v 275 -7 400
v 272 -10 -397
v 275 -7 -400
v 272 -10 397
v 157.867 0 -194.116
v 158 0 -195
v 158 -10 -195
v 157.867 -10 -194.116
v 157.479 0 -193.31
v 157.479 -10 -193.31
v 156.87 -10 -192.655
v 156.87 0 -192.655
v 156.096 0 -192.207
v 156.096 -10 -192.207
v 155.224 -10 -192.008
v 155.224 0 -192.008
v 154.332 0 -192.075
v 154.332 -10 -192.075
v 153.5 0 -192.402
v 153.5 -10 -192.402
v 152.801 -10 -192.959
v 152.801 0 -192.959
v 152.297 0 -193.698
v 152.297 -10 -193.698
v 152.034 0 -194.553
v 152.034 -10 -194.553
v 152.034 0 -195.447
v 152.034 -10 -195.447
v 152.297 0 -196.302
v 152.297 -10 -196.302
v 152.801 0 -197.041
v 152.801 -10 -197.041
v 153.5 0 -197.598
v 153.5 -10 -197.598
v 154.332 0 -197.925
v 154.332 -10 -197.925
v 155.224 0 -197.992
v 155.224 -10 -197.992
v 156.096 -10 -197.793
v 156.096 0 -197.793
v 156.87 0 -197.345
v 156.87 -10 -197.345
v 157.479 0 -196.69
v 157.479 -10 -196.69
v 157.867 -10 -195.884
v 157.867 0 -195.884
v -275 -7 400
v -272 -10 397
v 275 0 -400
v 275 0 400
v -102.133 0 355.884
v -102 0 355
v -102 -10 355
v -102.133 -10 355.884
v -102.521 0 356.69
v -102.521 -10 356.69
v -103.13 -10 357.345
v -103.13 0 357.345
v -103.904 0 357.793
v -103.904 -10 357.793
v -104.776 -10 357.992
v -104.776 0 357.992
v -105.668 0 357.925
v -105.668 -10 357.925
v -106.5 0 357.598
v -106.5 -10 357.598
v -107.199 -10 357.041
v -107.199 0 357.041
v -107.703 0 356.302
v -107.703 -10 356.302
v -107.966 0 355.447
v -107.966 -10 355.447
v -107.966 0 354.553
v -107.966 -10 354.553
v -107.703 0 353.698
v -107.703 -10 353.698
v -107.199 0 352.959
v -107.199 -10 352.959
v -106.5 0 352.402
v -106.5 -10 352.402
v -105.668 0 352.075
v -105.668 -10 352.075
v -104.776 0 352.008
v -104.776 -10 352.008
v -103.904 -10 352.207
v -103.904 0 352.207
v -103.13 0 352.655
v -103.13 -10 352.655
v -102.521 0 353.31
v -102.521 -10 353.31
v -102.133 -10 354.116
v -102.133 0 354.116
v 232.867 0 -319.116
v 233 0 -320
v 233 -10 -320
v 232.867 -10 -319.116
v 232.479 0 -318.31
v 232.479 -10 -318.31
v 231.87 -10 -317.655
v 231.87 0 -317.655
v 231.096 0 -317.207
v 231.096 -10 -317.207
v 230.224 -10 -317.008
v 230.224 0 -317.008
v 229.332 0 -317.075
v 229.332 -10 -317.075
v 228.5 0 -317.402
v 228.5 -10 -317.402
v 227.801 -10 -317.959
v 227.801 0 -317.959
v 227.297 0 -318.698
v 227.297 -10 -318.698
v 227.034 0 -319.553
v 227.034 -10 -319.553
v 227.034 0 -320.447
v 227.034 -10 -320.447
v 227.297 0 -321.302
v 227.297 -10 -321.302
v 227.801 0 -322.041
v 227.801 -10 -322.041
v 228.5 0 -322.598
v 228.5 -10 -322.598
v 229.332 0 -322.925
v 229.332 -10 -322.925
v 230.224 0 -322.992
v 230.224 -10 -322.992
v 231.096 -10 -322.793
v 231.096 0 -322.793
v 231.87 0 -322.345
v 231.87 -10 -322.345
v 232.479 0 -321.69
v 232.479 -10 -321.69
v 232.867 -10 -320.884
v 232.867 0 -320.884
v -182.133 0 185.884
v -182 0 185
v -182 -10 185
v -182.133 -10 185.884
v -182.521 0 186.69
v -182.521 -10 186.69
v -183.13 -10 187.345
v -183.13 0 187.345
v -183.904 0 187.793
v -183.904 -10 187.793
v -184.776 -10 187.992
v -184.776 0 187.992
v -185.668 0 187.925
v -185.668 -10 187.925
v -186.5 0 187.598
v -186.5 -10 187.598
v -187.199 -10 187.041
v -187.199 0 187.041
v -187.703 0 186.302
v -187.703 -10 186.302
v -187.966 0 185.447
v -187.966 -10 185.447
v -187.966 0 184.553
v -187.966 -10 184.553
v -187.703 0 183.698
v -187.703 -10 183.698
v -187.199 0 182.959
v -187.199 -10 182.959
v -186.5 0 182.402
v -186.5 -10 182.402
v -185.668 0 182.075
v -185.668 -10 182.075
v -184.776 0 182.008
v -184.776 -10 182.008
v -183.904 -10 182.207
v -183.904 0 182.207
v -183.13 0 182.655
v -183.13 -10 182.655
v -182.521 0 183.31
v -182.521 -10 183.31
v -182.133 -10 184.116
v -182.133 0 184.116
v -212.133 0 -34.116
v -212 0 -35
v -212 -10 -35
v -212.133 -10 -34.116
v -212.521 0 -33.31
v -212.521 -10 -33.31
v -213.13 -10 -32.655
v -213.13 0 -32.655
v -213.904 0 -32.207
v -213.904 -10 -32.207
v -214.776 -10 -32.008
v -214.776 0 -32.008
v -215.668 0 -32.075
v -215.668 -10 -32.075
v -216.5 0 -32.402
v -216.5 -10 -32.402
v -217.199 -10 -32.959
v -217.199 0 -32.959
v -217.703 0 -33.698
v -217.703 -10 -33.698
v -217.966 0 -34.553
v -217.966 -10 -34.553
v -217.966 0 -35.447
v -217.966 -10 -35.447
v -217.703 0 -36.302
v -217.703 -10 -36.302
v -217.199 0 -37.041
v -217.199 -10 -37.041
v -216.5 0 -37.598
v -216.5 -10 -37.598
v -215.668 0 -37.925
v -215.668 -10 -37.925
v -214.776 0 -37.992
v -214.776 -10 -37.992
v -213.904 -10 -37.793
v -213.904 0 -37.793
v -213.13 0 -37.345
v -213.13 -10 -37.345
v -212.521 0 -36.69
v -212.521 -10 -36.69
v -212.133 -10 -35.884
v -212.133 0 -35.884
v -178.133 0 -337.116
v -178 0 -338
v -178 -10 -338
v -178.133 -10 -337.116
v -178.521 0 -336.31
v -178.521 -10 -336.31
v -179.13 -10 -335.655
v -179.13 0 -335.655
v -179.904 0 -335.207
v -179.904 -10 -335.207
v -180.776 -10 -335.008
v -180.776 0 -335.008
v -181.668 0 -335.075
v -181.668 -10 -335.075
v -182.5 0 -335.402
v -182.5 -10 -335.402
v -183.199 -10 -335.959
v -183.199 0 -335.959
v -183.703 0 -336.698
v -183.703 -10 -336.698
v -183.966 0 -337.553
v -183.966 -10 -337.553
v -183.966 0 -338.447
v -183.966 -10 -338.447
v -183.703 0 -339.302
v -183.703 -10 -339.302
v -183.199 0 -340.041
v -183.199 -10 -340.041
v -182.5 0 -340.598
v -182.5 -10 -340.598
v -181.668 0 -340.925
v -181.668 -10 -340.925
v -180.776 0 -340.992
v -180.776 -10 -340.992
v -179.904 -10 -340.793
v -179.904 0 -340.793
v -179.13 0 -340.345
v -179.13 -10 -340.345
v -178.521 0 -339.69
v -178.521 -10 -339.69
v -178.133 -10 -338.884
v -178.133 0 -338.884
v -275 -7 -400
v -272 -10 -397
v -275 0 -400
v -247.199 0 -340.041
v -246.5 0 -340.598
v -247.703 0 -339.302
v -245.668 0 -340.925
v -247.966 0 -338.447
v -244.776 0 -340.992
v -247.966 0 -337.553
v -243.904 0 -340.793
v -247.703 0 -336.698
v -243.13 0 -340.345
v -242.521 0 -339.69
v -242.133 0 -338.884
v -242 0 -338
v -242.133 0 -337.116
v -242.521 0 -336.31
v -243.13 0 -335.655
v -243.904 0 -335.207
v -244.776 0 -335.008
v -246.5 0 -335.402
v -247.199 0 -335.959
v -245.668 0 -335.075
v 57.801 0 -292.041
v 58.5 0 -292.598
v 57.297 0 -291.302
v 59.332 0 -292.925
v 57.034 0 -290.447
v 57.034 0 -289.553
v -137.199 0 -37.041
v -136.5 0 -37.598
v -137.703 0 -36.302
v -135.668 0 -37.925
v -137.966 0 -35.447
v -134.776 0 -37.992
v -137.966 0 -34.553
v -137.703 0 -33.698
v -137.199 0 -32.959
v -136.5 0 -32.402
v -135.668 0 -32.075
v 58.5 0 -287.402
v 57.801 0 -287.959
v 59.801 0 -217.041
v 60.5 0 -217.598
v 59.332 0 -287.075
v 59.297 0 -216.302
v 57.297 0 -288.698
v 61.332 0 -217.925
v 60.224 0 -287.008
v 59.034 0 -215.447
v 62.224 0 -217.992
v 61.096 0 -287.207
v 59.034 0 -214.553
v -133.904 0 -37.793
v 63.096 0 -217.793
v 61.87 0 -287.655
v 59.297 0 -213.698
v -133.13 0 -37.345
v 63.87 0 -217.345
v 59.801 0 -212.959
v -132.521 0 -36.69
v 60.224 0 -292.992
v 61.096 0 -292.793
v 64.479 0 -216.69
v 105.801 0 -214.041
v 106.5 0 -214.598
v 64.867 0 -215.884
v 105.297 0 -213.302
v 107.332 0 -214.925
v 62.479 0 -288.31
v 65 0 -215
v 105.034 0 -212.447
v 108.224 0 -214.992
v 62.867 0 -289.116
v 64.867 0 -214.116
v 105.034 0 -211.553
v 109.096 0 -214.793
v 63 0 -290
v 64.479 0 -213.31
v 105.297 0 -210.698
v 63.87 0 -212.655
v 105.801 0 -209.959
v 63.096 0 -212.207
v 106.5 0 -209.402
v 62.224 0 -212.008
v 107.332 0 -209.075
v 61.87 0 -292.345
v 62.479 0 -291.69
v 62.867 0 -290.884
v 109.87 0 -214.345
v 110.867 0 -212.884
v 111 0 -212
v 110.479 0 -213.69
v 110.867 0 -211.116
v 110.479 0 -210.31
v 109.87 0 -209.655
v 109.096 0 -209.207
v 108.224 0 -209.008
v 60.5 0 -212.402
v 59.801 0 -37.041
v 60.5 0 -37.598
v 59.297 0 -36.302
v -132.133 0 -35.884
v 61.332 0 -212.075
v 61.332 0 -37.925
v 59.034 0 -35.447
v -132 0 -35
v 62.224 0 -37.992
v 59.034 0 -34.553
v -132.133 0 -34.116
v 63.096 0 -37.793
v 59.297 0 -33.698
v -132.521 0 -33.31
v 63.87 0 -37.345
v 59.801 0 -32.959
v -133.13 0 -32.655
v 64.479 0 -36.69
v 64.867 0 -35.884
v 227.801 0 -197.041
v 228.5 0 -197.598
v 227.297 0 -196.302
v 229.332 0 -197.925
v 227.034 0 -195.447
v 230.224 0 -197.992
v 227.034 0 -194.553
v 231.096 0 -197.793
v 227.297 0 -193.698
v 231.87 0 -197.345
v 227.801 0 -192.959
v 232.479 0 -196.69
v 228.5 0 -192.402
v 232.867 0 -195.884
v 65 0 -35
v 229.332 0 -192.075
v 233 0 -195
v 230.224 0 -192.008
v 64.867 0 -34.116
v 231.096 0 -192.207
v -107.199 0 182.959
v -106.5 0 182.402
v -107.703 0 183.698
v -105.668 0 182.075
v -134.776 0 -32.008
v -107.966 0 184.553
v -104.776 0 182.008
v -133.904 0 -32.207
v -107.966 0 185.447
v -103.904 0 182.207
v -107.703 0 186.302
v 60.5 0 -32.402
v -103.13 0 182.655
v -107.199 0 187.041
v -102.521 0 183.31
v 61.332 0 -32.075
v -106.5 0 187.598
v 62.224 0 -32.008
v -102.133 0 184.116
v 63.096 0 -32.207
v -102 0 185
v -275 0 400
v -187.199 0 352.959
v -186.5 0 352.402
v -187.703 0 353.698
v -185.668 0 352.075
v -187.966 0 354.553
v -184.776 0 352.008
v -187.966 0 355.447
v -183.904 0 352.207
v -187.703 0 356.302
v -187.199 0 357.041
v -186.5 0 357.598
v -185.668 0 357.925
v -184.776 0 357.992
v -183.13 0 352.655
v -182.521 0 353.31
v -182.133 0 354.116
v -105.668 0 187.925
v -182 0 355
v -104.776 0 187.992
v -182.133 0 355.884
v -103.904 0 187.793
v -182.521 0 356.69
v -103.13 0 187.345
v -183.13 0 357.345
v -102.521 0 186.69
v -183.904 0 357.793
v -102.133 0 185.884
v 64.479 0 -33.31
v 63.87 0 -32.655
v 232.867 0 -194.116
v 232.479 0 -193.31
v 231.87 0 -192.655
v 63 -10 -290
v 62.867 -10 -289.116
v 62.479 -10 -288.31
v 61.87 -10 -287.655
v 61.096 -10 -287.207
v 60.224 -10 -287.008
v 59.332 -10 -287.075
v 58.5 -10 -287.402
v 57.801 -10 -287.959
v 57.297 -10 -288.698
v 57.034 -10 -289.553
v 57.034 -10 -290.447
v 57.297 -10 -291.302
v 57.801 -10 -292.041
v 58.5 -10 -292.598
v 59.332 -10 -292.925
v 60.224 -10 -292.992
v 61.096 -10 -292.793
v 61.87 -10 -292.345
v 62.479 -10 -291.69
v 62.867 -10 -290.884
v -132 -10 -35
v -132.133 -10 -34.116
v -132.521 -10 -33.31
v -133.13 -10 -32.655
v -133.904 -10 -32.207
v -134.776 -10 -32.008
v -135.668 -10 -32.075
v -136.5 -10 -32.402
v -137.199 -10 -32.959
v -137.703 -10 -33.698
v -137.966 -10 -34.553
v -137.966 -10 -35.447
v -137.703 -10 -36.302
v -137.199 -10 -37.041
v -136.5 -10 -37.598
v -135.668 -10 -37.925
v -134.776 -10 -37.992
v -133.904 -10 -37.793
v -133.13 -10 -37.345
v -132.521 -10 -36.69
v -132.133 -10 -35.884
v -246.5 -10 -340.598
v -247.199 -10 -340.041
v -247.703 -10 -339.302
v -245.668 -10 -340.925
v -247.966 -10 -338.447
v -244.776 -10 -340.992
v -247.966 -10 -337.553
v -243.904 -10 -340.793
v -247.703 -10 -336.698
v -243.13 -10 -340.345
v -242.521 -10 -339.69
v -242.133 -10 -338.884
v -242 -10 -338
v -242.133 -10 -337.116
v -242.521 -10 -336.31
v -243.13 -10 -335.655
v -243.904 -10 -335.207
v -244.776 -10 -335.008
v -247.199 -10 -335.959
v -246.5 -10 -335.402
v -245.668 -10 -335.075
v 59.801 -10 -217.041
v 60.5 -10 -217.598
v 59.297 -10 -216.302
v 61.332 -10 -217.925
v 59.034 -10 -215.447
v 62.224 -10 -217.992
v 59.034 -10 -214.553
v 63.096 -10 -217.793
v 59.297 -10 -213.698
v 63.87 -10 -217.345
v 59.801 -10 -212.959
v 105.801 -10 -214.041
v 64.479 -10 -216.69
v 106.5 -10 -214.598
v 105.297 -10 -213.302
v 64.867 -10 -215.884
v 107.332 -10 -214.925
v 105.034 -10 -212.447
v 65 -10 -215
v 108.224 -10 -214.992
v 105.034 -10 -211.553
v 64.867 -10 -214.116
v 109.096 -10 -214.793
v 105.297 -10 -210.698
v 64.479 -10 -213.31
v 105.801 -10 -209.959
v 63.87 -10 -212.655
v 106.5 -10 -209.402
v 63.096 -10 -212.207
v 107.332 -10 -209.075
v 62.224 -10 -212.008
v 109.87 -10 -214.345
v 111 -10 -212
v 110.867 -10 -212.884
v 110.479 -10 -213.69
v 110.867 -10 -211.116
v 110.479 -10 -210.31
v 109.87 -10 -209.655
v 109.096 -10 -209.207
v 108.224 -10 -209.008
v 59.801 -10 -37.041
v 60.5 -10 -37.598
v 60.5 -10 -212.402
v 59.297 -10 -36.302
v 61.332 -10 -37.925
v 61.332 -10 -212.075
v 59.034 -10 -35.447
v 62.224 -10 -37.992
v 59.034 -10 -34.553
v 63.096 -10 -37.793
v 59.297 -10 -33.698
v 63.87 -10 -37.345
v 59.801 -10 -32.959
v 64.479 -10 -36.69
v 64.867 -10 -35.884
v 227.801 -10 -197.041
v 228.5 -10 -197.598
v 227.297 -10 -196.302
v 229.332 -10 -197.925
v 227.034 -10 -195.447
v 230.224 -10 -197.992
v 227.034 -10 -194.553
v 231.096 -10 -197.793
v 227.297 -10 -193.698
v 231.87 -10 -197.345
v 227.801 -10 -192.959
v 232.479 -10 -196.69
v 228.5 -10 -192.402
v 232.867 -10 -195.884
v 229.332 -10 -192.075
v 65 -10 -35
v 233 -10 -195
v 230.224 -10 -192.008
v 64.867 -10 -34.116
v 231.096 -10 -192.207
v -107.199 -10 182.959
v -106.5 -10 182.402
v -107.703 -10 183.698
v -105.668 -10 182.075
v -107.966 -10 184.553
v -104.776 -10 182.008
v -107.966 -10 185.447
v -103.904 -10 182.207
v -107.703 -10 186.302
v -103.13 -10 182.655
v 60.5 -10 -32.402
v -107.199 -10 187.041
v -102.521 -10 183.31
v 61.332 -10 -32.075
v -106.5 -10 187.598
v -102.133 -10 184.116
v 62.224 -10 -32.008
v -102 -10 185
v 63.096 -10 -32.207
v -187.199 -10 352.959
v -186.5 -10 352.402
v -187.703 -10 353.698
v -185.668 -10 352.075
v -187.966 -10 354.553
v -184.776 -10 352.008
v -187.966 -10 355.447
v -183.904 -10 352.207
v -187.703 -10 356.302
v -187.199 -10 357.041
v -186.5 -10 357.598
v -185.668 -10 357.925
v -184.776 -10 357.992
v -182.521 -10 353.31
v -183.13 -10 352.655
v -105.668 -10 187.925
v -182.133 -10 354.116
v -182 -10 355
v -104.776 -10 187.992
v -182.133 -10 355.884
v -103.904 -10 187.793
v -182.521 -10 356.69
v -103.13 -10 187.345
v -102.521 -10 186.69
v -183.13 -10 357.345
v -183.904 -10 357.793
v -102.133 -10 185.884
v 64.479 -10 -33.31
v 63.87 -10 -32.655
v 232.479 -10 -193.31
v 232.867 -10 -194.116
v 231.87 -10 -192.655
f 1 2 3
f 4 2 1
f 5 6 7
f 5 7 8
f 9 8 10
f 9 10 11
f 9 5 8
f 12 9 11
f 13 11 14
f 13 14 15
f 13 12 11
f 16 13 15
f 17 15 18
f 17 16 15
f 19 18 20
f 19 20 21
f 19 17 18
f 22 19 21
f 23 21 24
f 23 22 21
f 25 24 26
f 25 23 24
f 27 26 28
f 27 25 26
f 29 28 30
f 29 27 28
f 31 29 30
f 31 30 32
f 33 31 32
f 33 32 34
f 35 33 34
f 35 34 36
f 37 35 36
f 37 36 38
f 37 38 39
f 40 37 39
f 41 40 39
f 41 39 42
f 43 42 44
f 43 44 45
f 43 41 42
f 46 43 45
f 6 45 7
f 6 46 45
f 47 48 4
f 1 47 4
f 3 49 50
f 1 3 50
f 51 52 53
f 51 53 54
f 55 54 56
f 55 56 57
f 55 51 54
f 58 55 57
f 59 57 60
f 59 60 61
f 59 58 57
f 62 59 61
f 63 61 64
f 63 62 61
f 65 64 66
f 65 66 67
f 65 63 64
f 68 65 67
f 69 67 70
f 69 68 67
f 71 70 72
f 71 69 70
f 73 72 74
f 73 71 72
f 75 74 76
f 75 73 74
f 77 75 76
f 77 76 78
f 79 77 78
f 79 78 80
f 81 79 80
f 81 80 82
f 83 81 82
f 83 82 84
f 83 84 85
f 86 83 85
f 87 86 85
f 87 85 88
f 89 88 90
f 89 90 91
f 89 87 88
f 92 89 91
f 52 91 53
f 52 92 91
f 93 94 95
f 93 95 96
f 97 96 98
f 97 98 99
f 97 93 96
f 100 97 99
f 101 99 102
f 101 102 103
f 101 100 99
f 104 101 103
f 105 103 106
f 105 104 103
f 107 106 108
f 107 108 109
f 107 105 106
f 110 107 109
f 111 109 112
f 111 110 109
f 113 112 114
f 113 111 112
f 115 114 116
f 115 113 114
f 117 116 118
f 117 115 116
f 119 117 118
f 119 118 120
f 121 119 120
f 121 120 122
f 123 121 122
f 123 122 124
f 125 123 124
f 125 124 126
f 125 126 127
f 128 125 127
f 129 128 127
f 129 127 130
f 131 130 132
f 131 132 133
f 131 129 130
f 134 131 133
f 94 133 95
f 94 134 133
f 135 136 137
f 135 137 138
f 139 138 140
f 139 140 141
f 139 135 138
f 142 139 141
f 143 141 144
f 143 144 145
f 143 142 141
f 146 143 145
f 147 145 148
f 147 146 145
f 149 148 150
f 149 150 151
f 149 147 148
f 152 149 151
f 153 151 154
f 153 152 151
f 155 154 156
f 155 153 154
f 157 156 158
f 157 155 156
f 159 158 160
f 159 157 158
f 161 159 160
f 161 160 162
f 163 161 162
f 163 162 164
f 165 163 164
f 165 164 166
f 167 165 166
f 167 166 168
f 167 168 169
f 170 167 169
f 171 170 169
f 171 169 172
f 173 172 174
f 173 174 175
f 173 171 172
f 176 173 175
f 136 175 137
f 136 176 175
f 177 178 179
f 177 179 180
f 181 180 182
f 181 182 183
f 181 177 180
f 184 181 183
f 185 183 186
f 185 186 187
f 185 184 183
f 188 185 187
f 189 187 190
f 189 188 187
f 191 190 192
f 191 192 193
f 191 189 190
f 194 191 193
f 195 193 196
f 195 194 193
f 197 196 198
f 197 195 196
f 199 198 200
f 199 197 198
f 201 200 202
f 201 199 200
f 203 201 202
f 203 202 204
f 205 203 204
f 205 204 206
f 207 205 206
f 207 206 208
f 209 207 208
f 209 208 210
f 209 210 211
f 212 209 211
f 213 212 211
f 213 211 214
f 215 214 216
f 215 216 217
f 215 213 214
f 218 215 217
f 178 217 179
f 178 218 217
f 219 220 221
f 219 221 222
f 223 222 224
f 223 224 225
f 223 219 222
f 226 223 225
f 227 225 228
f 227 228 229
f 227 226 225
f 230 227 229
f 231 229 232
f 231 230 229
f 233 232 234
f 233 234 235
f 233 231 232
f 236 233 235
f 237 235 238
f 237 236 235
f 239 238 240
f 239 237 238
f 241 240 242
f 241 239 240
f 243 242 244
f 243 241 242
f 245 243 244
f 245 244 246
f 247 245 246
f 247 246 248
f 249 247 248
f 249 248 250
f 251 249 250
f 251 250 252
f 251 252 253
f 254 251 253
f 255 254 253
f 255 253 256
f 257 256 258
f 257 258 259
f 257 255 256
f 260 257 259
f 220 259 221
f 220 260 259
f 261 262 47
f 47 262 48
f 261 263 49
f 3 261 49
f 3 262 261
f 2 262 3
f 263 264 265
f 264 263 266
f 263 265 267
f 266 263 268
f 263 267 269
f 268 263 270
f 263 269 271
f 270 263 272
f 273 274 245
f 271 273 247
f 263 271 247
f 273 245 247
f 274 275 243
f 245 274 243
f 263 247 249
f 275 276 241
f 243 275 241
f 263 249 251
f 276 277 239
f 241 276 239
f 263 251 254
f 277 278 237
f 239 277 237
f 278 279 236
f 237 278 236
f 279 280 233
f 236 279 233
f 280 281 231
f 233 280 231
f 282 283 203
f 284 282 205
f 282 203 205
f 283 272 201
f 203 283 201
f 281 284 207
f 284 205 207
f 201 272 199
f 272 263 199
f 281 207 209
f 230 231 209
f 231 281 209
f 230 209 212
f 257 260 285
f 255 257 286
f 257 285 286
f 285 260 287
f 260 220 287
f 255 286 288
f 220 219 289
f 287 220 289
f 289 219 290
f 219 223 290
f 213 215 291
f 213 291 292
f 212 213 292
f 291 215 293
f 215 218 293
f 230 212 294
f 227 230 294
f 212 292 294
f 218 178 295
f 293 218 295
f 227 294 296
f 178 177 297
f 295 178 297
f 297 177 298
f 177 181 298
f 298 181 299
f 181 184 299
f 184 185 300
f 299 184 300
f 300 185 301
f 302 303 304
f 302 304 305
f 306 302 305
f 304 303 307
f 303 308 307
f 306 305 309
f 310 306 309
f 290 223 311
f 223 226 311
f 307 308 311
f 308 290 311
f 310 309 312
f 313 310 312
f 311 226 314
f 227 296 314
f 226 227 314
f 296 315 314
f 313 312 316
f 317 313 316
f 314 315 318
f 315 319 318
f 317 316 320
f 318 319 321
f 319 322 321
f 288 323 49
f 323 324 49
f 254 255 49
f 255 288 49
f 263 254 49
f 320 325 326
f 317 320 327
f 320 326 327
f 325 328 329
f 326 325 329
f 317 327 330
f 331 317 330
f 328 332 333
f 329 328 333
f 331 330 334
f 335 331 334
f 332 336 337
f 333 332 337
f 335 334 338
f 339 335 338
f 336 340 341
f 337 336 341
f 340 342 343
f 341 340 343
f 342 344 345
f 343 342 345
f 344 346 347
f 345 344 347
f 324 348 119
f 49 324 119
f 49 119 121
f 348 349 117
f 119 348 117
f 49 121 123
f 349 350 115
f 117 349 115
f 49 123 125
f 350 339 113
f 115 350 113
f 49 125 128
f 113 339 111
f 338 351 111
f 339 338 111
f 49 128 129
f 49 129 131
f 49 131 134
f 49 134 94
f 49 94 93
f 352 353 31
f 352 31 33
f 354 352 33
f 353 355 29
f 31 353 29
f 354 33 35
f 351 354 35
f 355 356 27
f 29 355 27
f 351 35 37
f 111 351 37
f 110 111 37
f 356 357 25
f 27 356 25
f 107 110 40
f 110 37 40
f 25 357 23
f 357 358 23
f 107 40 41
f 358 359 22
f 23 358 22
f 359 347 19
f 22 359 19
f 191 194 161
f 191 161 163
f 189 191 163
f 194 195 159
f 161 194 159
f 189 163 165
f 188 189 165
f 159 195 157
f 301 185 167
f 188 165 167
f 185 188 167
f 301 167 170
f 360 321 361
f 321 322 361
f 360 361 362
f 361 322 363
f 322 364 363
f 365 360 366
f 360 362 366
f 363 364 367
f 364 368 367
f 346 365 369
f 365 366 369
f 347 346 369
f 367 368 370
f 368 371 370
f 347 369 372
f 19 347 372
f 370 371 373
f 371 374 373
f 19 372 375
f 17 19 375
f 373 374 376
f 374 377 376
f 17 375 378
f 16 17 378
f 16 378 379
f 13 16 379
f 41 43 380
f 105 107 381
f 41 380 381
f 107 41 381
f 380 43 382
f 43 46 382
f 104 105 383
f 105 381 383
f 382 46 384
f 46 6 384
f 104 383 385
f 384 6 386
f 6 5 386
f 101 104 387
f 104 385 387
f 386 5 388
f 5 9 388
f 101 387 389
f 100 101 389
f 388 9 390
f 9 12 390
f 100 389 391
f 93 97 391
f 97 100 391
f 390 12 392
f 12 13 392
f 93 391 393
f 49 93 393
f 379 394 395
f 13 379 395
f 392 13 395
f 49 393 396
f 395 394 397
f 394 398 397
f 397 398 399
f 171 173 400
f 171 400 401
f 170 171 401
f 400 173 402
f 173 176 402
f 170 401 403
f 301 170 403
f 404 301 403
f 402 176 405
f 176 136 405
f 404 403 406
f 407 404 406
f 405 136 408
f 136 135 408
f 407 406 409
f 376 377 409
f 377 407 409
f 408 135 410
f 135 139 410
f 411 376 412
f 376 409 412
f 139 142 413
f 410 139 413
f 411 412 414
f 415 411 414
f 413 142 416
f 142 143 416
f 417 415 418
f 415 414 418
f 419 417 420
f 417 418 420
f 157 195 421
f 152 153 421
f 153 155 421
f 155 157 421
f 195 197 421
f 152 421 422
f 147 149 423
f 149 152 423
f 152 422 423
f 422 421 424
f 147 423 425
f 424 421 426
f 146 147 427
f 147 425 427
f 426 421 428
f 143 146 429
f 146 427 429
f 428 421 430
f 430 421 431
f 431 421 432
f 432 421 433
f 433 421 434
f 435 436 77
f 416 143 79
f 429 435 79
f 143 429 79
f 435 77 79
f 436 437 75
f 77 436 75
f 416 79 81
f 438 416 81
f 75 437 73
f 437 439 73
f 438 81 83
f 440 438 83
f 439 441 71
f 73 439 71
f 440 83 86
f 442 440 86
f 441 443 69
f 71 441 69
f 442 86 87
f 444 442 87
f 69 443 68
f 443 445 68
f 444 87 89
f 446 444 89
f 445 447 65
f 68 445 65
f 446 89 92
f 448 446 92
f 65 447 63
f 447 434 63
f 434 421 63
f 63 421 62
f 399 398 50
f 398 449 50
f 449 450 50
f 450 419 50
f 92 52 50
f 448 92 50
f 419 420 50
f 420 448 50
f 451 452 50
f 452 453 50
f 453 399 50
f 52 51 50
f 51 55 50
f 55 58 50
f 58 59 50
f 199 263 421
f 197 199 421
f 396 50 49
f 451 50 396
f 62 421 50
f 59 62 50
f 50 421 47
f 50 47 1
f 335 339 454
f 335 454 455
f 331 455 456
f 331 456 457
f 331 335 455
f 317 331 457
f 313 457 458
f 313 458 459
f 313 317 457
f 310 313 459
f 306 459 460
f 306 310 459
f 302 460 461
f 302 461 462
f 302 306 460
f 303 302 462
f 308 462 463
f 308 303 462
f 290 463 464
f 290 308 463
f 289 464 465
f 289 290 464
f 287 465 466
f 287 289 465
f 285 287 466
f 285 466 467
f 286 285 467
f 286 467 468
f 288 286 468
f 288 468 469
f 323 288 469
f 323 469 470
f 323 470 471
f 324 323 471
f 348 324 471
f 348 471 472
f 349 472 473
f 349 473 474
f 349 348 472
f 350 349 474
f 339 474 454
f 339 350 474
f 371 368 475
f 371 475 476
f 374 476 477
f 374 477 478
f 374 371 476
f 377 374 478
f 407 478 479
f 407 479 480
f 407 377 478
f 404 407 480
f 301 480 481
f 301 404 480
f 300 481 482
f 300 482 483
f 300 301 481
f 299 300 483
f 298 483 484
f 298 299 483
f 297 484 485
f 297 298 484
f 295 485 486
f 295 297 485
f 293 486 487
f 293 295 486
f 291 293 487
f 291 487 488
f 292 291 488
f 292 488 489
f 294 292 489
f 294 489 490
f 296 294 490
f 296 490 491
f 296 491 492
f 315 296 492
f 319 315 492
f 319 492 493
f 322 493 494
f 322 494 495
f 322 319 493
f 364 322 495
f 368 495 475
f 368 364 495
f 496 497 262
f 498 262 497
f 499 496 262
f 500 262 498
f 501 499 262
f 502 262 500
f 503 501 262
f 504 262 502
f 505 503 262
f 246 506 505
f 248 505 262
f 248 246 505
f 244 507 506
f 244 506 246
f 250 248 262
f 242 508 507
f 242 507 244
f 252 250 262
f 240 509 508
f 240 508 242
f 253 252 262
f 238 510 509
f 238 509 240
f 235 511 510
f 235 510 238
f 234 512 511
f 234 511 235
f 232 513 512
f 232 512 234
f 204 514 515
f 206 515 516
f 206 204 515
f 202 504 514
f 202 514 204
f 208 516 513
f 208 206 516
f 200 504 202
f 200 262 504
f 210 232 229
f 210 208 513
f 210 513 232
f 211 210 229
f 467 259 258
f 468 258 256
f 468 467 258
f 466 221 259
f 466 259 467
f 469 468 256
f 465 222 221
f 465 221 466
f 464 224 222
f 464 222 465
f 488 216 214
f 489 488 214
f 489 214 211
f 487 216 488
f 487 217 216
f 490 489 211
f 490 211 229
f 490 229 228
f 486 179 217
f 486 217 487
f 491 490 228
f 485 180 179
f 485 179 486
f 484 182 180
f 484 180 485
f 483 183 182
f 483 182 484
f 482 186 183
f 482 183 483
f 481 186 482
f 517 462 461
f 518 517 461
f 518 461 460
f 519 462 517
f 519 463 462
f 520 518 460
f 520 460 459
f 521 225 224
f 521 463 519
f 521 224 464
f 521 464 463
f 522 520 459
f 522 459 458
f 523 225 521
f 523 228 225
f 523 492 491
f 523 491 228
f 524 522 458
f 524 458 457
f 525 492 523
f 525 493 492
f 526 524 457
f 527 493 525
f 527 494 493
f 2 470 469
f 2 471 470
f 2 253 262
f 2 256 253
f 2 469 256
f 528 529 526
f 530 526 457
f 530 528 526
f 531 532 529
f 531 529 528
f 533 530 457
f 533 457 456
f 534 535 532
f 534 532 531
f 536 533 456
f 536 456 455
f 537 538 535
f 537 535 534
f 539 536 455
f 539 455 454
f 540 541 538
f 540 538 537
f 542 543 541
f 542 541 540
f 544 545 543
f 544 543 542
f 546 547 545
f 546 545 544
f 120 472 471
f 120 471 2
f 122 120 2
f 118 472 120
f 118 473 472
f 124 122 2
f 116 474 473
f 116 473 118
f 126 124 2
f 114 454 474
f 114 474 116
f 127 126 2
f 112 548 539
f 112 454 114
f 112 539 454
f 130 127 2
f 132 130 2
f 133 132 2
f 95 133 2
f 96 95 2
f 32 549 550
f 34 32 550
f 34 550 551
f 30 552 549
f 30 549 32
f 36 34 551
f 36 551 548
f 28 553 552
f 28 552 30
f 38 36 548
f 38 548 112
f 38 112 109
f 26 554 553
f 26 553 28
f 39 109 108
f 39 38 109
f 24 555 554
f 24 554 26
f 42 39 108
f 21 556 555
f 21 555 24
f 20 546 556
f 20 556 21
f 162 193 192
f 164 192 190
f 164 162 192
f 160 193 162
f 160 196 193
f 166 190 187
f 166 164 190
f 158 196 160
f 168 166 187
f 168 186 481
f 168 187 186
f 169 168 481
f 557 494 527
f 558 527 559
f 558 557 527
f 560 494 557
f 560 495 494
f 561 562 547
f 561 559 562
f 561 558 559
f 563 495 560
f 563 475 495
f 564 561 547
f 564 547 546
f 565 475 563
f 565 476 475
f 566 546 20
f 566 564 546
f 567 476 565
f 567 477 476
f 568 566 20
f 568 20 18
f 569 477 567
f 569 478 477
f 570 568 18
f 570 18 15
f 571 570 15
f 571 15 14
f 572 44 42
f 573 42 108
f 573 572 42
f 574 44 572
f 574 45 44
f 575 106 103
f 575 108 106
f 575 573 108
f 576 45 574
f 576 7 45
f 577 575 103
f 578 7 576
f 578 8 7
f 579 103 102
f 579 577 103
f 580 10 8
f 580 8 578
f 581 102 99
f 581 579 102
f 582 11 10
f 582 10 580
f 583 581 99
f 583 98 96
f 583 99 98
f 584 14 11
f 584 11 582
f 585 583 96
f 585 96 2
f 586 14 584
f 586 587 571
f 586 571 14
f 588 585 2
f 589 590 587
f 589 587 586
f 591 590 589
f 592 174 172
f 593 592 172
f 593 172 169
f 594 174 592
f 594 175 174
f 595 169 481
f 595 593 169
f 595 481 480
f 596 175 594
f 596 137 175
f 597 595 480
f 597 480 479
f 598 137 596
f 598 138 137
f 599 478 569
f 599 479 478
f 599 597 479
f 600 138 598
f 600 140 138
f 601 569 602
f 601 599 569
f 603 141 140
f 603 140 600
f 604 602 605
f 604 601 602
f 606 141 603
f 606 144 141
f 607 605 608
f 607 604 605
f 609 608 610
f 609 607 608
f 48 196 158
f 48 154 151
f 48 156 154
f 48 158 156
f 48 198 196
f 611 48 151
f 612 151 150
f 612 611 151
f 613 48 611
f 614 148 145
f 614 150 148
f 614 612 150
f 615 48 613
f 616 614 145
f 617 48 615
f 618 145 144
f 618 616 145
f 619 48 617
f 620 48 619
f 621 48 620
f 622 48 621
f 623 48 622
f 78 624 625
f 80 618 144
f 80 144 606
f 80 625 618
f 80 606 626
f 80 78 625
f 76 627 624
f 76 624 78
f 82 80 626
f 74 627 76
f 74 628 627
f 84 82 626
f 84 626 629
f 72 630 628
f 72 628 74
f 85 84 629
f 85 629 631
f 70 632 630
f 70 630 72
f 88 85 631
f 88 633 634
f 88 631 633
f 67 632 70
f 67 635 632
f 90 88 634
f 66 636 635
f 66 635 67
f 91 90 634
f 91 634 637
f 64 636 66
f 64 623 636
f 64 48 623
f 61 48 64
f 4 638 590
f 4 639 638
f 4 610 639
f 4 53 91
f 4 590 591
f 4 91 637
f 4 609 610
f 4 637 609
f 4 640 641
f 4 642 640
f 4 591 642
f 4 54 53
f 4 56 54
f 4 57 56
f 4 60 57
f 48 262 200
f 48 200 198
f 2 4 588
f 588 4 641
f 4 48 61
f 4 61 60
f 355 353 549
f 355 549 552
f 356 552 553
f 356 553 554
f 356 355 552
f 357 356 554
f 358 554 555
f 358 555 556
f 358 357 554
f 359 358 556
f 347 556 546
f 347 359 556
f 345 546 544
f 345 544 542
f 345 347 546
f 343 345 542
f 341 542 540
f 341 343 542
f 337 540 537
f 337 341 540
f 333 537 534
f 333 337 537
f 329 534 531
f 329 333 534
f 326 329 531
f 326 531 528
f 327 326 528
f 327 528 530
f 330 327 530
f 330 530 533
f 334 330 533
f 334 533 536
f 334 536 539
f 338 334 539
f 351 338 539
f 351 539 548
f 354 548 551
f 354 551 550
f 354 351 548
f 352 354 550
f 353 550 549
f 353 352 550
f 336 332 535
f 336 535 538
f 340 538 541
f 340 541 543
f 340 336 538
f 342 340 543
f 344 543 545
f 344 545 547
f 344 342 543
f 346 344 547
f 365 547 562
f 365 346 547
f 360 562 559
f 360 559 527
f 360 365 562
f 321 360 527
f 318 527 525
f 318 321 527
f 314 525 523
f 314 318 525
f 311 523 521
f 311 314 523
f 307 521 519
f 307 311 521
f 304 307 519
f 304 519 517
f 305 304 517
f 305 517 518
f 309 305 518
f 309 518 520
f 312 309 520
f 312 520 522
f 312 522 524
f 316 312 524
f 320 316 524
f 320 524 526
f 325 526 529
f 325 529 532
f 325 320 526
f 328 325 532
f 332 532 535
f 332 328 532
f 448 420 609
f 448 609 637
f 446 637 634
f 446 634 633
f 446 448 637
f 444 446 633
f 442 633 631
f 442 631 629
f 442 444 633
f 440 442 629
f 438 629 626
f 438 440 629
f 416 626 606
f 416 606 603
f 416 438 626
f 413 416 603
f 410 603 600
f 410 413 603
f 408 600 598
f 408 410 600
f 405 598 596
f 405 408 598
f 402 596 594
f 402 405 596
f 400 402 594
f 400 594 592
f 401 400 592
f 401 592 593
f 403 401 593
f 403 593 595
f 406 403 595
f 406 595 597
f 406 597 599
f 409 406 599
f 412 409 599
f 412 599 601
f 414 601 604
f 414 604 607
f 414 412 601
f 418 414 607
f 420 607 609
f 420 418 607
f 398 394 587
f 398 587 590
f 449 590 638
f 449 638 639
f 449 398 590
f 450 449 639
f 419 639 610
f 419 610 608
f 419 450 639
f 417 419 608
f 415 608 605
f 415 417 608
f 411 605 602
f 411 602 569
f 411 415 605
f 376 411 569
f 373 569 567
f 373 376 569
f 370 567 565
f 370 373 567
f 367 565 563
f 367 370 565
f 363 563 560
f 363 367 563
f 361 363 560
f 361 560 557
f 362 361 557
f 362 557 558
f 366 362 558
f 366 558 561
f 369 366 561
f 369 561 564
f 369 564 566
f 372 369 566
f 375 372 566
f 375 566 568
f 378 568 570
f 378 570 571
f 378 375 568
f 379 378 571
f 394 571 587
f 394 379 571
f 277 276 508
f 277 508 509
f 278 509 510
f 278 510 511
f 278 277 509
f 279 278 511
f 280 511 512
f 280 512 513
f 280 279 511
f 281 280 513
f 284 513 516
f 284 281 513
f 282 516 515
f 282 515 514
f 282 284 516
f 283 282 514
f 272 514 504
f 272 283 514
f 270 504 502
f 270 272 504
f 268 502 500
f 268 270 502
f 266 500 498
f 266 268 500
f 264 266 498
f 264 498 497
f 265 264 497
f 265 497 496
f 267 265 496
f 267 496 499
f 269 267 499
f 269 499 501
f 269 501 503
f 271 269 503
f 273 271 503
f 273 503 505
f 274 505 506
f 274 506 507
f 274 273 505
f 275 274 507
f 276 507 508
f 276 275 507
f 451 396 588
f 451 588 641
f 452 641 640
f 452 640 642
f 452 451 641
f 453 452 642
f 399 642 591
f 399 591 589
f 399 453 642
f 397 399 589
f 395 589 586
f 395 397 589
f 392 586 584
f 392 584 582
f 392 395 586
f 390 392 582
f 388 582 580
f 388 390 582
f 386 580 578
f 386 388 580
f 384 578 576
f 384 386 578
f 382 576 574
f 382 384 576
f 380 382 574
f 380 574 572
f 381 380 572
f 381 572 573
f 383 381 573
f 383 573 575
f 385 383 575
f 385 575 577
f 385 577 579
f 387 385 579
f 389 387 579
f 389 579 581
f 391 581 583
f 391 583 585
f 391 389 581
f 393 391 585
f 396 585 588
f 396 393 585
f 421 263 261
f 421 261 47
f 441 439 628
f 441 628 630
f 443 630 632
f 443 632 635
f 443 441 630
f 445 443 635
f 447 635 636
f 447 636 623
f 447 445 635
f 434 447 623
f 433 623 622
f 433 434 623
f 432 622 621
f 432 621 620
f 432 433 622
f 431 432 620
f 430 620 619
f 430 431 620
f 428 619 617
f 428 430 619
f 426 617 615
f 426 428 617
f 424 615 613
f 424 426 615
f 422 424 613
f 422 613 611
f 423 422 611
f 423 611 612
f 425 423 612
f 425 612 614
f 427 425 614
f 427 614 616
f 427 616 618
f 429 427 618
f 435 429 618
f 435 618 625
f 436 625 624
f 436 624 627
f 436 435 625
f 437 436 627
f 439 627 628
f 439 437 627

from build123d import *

# Parameters (mm, degrees)
F0_W     = 550
F0_H     = 800
F0_R     = 3
F1_DEPTH = 10
F2_SIZE  = 3


with BuildPart() as f1:
    # F0 (on Front) → F1 (new body)
    with BuildSketch(Plane.XZ):
        Rectangle(F0_W, F0_H)
        with Locations((-245, -338)):
            Circle(F0_R, mode=Mode.SUBTRACT)
        with Locations((-181, -338)):
            Circle(F0_R, mode=Mode.SUBTRACT)
        with Locations((-215, -35)):
            Circle(F0_R, mode=Mode.SUBTRACT)
        with Locations((-135, -35)):
            Circle(F0_R, mode=Mode.SUBTRACT)
        with Locations((60, -290)):
            Circle(F0_R, mode=Mode.SUBTRACT)
        with Locations((62, -215)):
            Circle(F0_R, mode=Mode.SUBTRACT)
        with Locations((108, -212)):
            Circle(F0_R, mode=Mode.SUBTRACT)
        with Locations((230, -320)):
            Circle(F0_R, mode=Mode.SUBTRACT)
        with Locations((62, -35)):
            Circle(F0_R, mode=Mode.SUBTRACT)
        with Locations((155, -195)):
            Circle(F0_R, mode=Mode.SUBTRACT)
        with Locations((230, -195)):
            Circle(F0_R, mode=Mode.SUBTRACT)
        with Locations((-185, 185)):
            Circle(F0_R, mode=Mode.SUBTRACT)
        with Locations((-105, 185)):
            Circle(F0_R, mode=Mode.SUBTRACT)
        with Locations((-185, 355)):
            Circle(F0_R, mode=Mode.SUBTRACT)
        with Locations((-105, 355)):
            Circle(F0_R, mode=Mode.SUBTRACT)
    extrude(amount=F1_DEPTH)

    # F2
    f2_edges = [f1.edges().sort_by_distance(p)[0] for p in [
        (-275, -10, 0),
        (0, -10, 400),
        (275, -10, 0),
        (0, -10, -400),
    ]]
    chamfer(f2_edges, length=F2_SIZE)


solid = f1.part
